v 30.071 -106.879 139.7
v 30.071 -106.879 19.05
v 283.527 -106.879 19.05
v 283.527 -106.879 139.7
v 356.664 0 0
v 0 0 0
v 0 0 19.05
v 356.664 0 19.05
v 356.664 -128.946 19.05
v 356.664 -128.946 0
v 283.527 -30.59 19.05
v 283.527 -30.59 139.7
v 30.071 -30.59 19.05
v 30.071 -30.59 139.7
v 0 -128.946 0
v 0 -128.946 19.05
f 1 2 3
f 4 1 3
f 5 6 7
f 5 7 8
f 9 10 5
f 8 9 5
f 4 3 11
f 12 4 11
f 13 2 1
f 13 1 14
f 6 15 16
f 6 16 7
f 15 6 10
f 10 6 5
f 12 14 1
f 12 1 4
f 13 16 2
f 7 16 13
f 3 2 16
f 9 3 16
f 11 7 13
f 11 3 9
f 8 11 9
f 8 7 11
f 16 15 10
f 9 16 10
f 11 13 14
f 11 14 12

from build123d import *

# Parameters (mm, degrees)
F0_W     = 253.456043
F0_H     = 76.289
F1_DEPTH = 139.7
F0_W_2   = 356.663674
F0_H_2   = 128.946438
F2_DEPTH = 19.05


with BuildPart() as f1:
    # F0 (on Top) → F1 (new body)
    with BuildSketch(Plane.XY):
        with Locations((156.799115, -68.734861)):
            Rectangle(F0_W, F0_H)
    extrude(amount=F1_DEPTH)

    # F0 (on Top) → F2 (join)
    with BuildSketch(Plane.XY):
        with Locations((178.331837, -64.473219)):
            Rectangle(F0_W_2, F0_H_2)
        with Locations((156.799115, -68.734861)):
            Rectangle(F0_W, F0_H, mode=Mode.SUBTRACT)
    extrude(amount=F2_DEPTH)


solid = f1.part
